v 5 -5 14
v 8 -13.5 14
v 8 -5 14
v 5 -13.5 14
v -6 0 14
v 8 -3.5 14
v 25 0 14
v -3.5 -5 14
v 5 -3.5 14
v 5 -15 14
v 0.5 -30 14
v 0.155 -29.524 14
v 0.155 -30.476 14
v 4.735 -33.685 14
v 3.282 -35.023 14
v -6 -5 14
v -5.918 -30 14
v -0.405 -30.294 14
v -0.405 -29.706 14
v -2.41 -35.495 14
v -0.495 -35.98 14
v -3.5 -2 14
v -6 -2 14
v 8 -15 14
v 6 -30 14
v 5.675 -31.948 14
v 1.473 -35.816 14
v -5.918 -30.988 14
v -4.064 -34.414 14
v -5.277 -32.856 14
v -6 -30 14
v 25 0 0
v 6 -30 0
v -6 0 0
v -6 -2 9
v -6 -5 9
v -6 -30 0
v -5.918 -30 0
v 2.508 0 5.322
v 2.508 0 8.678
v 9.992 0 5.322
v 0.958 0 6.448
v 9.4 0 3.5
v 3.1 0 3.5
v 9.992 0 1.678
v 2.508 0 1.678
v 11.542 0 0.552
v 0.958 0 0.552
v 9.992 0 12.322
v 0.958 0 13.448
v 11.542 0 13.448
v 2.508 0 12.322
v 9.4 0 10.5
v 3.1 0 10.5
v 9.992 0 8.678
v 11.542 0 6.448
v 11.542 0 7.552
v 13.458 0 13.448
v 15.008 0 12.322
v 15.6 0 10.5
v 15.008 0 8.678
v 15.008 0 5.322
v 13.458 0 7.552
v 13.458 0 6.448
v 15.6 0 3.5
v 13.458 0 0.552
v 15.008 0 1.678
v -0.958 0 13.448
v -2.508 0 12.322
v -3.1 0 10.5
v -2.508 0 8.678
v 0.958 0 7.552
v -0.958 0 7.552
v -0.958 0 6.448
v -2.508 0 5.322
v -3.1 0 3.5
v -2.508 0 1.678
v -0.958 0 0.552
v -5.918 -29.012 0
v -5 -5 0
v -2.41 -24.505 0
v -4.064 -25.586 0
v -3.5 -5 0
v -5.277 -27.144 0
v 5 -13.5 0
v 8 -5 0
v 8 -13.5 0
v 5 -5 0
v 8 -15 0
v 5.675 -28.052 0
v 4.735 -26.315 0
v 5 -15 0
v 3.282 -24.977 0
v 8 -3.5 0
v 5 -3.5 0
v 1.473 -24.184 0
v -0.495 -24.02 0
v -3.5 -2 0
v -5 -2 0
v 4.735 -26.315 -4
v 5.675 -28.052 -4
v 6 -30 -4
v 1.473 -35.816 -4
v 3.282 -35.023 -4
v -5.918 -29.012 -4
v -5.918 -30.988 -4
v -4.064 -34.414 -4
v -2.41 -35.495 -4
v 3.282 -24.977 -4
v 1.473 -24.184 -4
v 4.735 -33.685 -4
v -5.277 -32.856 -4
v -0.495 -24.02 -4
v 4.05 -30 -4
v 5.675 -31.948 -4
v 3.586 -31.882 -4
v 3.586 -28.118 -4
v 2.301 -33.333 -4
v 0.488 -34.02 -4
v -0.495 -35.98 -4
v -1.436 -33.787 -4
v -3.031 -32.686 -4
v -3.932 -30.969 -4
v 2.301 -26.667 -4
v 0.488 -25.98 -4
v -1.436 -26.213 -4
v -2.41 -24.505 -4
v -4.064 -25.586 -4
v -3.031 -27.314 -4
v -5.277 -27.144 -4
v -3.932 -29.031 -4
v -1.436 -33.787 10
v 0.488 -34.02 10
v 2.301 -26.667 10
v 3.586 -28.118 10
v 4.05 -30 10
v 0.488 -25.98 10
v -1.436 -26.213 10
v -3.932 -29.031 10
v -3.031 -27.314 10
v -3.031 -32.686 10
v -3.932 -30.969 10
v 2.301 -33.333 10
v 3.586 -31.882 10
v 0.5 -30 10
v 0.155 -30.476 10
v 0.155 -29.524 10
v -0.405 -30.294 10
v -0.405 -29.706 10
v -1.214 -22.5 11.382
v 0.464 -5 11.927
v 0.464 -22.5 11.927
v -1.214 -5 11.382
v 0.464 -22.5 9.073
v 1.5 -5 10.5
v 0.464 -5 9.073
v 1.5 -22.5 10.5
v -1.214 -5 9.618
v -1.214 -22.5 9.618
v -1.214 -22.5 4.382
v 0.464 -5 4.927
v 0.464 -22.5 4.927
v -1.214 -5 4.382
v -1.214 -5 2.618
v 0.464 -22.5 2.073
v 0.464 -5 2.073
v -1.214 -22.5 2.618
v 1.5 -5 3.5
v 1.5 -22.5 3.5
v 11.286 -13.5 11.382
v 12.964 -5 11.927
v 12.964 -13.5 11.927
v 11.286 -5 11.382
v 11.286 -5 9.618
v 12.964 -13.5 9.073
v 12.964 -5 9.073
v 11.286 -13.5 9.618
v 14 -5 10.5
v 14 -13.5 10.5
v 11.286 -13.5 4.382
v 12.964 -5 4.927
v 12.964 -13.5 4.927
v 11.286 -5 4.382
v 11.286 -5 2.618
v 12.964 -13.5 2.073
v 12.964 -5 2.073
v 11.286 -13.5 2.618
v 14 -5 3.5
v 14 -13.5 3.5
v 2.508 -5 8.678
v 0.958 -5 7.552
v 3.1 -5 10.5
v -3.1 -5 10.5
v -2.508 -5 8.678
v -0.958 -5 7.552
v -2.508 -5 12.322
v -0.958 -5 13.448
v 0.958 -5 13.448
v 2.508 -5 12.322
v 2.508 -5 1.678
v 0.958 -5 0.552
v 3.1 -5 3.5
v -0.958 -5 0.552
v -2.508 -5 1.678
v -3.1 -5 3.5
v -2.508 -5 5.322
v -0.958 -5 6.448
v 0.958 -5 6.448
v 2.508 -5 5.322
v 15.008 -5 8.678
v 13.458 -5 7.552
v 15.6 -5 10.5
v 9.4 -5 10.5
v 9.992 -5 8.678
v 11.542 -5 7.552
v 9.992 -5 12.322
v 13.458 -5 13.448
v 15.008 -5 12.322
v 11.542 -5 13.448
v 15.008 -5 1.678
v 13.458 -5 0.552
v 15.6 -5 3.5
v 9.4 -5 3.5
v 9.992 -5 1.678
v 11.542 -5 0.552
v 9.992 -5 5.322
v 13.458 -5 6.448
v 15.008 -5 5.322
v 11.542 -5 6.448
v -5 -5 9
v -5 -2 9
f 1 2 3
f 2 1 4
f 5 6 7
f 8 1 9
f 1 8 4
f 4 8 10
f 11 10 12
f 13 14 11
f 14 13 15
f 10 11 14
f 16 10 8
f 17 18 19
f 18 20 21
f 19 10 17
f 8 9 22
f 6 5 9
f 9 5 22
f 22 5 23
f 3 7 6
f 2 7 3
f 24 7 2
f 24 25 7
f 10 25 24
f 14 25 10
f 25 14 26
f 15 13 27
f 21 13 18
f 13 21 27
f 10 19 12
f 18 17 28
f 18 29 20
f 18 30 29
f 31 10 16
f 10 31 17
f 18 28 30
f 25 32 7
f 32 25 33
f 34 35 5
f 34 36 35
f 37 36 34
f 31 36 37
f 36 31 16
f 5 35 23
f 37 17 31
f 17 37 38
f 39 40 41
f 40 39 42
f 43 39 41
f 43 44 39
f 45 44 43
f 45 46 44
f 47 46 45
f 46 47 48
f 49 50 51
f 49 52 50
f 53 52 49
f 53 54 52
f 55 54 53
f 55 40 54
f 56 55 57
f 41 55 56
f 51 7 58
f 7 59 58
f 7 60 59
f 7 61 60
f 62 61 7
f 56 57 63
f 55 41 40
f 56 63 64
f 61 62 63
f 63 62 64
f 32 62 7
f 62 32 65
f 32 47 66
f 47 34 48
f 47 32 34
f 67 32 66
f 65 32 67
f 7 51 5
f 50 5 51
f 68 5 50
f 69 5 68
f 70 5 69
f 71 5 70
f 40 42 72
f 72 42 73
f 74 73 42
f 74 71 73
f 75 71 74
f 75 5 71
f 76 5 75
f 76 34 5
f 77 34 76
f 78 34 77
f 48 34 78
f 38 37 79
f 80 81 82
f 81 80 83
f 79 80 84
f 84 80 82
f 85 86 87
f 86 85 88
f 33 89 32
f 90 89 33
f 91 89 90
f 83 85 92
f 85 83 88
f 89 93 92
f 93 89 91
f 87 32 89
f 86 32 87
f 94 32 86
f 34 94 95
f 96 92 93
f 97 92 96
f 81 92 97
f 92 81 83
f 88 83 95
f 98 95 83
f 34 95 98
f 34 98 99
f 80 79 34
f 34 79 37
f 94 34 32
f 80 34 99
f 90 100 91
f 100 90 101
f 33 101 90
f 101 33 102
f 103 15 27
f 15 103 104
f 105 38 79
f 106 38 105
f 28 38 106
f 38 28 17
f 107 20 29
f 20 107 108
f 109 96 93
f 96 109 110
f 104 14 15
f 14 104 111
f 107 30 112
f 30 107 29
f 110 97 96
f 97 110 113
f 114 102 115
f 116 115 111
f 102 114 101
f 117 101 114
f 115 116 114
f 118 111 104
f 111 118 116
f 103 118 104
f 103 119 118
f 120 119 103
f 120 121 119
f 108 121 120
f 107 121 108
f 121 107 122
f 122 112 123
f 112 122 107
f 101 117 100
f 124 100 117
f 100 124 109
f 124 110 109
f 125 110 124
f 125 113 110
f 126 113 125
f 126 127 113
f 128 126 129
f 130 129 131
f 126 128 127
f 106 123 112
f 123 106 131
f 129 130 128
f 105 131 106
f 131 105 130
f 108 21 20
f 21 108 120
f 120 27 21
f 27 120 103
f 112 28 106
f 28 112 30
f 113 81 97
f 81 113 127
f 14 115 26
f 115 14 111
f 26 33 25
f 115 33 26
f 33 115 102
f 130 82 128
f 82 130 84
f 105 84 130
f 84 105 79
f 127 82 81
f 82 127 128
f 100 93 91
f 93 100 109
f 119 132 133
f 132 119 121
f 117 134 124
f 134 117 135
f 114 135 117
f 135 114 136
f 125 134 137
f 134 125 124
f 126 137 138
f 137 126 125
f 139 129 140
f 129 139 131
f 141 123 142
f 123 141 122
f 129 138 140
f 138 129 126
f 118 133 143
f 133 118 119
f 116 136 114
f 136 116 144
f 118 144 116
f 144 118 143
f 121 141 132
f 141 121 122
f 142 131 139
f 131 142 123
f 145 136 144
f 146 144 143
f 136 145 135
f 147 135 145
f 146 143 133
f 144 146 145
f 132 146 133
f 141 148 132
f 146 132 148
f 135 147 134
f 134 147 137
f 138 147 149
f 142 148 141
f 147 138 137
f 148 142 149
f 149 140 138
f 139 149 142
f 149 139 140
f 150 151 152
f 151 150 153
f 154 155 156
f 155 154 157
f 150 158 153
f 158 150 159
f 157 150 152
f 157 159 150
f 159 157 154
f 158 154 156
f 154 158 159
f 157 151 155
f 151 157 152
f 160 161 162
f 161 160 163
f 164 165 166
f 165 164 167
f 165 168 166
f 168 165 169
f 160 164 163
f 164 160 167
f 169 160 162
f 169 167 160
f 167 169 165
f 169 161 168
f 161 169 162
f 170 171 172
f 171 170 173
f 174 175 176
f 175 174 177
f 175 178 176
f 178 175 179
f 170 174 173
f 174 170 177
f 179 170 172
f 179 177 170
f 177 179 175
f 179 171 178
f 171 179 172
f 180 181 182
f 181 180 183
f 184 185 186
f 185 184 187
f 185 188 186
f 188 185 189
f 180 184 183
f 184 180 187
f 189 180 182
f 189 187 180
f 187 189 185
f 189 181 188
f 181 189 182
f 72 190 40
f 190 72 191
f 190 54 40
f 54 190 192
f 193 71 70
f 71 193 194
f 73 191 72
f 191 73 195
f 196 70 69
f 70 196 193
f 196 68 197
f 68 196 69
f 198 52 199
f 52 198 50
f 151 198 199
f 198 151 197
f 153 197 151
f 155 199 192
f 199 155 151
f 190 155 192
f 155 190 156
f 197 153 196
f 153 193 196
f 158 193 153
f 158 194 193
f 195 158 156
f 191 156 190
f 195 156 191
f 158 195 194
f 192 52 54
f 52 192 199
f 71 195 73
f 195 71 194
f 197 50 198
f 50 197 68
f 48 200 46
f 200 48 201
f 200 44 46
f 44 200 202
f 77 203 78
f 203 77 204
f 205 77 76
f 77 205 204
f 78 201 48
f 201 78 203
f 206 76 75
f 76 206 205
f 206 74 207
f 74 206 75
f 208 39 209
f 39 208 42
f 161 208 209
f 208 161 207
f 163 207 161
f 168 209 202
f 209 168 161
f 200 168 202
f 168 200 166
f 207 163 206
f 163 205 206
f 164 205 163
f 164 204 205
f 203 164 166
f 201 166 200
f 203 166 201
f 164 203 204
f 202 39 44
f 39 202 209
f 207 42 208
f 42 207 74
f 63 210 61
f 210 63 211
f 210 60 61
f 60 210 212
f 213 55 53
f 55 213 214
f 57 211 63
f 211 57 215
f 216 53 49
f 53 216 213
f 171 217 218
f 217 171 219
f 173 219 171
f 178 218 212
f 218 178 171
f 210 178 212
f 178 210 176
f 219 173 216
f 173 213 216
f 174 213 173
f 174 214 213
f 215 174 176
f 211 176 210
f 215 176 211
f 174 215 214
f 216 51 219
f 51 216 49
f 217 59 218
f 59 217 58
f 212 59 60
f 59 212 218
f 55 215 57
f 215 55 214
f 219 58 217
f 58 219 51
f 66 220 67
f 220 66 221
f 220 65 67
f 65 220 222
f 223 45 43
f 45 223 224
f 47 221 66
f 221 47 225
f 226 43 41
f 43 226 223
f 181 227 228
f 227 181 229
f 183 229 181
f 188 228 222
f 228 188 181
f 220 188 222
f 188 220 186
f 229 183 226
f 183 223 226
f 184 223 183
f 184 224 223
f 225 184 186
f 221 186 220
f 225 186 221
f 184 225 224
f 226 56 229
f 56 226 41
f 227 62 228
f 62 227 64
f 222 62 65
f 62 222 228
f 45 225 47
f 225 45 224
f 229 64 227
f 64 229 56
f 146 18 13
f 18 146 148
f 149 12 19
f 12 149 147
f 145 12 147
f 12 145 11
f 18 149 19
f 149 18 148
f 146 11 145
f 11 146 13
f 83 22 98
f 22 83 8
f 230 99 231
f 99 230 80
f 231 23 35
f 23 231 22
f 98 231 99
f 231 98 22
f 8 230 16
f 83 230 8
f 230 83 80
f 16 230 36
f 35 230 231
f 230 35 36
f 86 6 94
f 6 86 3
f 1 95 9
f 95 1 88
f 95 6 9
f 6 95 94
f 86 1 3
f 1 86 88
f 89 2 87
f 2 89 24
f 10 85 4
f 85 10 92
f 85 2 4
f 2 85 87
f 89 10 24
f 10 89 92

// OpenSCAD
// file: front_axle_mount.scad
//include <NopSCADlib/core.scad>
//include <NopSCADlib/vitamins/pcbs.scad>
//include <NopSCADlib/vitamins/pcb.scad>

axle_mount_thickness=14;
axle_mount_tip_thickness=18;
root_height=25;
axle_mount_tip_radius=6;
axle_mount_length=30;

m3_hole_radius=1.5;

// Variables from backplate.scad
mount_support_radius=m3_hole_radius+1.6;
mount_support_height=5;

module plain_axle_mount() {
    color("PaleGreen",0.7) 
    difference() {
        // main body
        union() {
            // form the base
            points=[[root_height,0],[axle_mount_tip_radius,-axle_mount_length],[-axle_mount_tip_radius,-axle_mount_length],[-axle_mount_tip_radius,0]];
            linear_extrude(axle_mount_thickness, center = false, convexity = 4) 
                polygon(points);
            // form the tip
            linear_extrude(axle_mount_tip_thickness, center = false, convexity = 4) 
                translate([0,-axle_mount_length,0]) circle(r=axle_mount_tip_radius);
        }
        // cutout for the axle
        translate([0,-axle_mount_length,axle_mount_tip_thickness-axle_mount_thickness]) 
            cylinder(h=axle_mount_thickness+1, r=4.05);
        // holes for the screws
        translate([0,0.5,axle_mount_thickness/4]) rotate(a=90, v=[1,0,0]) cylinder(h=22+1, r=m3_hole_radius);
        translate([0,0.5,axle_mount_thickness*3/4]) rotate(a=90, v=[1,0,0]) cylinder(h=22+1, r=m3_hole_radius);
        translate([root_height/2,0.5,axle_mount_thickness/4]) rotate(a=90, v=[1,0,0]) cylinder(h=13+1, r=m3_hole_radius);
        translate([root_height/2,0.5,axle_mount_thickness*3/4]) rotate(a=90, v=[1,0,0]) cylinder(h=13+1, r=m3_hole_radius);
        // holes for the mount supports on the backplate
        translate([0,1,axle_mount_thickness/4]) rotate(a=90, v=[1,0,0]) 
            cylinder(h=mount_support_height+1, r=mount_support_radius);
        translate([0,1,axle_mount_thickness*3/4]) rotate(a=90, v=[1,0,0]) 
            cylinder(h=mount_support_height+1, r=mount_support_radius);
        translate([root_height/2,1,axle_mount_thickness/4]) rotate(a=90, v=[1,0,0]) 
            cylinder(h=mount_support_height+1, r=mount_support_radius);
        translate([root_height/2,1,axle_mount_thickness*3/4]) rotate(a=90, v=[1,0,0]) 
            cylinder(h=mount_support_height+1, r=mount_support_radius);
        // tiny hole to let air into the cylinder
        translate([0,-axle_mount_length,-0.5]) cylinder(h=axle_mount_tip_thickness-axle_mount_thickness+1, d=1);
    }
}

// guide holes for the screws
/*
translate([0,0.5,axle_mount_thickness/4]) rotate(a=90, v=[1,0,0]) cylinder(h=22+1, r=m3_hole_radius);
translate([0,0.5,axle_mount_thickness*3/4]) rotate(a=90, v=[1,0,0]) cylinder(h=22+1, r=m3_hole_radius);
translate([root_height/2,0.5,axle_mount_thickness/4]) rotate(a=90, v=[1,0,0]) cylinder(h=13+1, r=m3_hole_radius);
translate([root_height/2,0.5,axle_mount_thickness*3/4]) rotate(a=90, v=[1,0,0]) cylinder(h=13+1, r=m3_hole_radius);
*/

// standoffs for mounting the ULN2003 driver board using M3x4 screws
module standoff(support=false) {
    color("Crimson", 0.2)
    difference() {
        // main body
        if (support==true) cylinder(h=6, d=5);
        else cylinder(h=3, d=5);
        // cutout m3 hole
        if (support==true) translate([0,0,-1]) cylinder(h=3+1, r=m3_hole_radius);
        else translate([0,0,-0.5]) cylinder(h=3+1, r=m3_hole_radius);
    }
}
//standoff();

module front_axle_mount() {
    //color("PaleGreen",0.7)
    union() {
        // add the standoffs for the ULN2003 driver board
        translate([-3.5,-2.75,-3]) standoff();
        //translate([-2.75,-2.75,-3]) standoff();
        translate([-3.5+23.5+3,-2.75,-3]) standoff(support=true);
        translate([-3.5,-2.75-26.5-3,-3]) standoff(support=true);
        // main body using plain_axle_mount
        difference() {
            plain_axle_mount();
            // remove the protrusion for 3d-printing on the top face
            translate([-root_height/2,-axle_mount_length-axle_mount_tip_radius-1,axle_mount_thickness]) 
                cube([root_height,root_height,axle_mount_tip_thickness-axle_mount_thickness+1]);
        }

    }
}

front_axle_mount();


//translate([10,-18,-3]) rotate(a=90, v=[0,0,1]) rotate(a=180, v=[0,1,0]) pcb(ZC_A0591);
// main file
use <front_axle_mount.scad>

axle_mount_thickness=14;
root_height=25;
m3_hole_radius=1.5;

module rear_axle_mount() {
    difference() {
        translate([0,0,axle_mount_thickness]) mirror([0,0,1]) plain_axle_mount();
        // hole for power cables ziptie
        translate([-5,-5,-0.5]) cube([1.5,3,axle_mount_thickness+1]);
        translate([-7,-5,axle_mount_thickness-5]) cube([3,3,6]);
        // parallel holes for ziptie cable management
        translate([5,-5,-0.5]) cube([3,1.5,axle_mount_thickness+1]);
        translate([5,-15,-0.5]) cube([3,1.5,axle_mount_thickness+1]);
    }
}

/*
union() {
    translate([-4.5,-5,-1]) cube([1.5,3,9]);
    translate([-3.75,-2,8]) rotate(a=90, v=[1,0,0]) difference() {
        cylinder(h=3, r=0.75);
        translate([-2,-2,-1]) cube([4,2,5]);
    }
    translate([-4-4.5+0.75,-5,7.25]) cube([4,3,1.5]);
}
*/
// guide holes for the screws
/*
translate([0,0,axle_mount_thickness]) mirror([0,0,1]) {
    translate([0,0.5,axle_mount_thickness/4]) rotate(a=90, v=[1,0,0]) cylinder(h=20+1, r=m3_hole_radius);
    translate([0,0.5,axle_mount_thickness*3/4]) rotate(a=90, v=[1,0,0]) cylinder(h=20+1, r=m3_hole_radius);
    translate([root_height/2,0.5,axle_mount_thickness/4]) rotate(a=90, v=[1,0,0]) cylinder(h=12+1, r=m3_hole_radius);
    translate([root_height/2,0.5,axle_mount_thickness*3/4]) rotate(a=90, v=[1,0,0]) cylinder(h=12+1, r=m3_hole_radius);
}
*/
rear_axle_mount();






//axle_mount_thickness=10;
//axle_mount_tip_thickness=15;
//root_height=25;
//axle_mount_tip_radius=6;
//axle_mount_length=30;
//module rear_axle_mount() {
//    color("PaleGreen",0.7) difference() {
//        // main body
//        union() {
//            // form the base
//            points=[[root_height,0],[axle_mount_tip_radius,-axle_mount_length],[-axle_mount_tip_radius,-axle_mount_length],[-axle_mount_tip_radius,0]];
//            linear_extrude(axle_mount_thickness, center = false, convexity = 4) 
//                polygon(points);
//            // form the tip
//            translate([0,0,-axle_mount_tip_thickness+axle_mount_thickness])
//                linear_extrude(axle_mount_tip_thickness, center = false, convexity = 4) 
//                    translate([0,-axle_mount_length,0]) circle(r=axle_mount_tip_radius);
//        }
//        // cutout for the axle
//        translate([0,-axle_mount_length,-axle_mount_tip_thickness+axle_mount_thickness-1]) cylinder(h=axle_mount_thickness+1, r=4.05);
//    }
//}
//rear_axle_mount();
